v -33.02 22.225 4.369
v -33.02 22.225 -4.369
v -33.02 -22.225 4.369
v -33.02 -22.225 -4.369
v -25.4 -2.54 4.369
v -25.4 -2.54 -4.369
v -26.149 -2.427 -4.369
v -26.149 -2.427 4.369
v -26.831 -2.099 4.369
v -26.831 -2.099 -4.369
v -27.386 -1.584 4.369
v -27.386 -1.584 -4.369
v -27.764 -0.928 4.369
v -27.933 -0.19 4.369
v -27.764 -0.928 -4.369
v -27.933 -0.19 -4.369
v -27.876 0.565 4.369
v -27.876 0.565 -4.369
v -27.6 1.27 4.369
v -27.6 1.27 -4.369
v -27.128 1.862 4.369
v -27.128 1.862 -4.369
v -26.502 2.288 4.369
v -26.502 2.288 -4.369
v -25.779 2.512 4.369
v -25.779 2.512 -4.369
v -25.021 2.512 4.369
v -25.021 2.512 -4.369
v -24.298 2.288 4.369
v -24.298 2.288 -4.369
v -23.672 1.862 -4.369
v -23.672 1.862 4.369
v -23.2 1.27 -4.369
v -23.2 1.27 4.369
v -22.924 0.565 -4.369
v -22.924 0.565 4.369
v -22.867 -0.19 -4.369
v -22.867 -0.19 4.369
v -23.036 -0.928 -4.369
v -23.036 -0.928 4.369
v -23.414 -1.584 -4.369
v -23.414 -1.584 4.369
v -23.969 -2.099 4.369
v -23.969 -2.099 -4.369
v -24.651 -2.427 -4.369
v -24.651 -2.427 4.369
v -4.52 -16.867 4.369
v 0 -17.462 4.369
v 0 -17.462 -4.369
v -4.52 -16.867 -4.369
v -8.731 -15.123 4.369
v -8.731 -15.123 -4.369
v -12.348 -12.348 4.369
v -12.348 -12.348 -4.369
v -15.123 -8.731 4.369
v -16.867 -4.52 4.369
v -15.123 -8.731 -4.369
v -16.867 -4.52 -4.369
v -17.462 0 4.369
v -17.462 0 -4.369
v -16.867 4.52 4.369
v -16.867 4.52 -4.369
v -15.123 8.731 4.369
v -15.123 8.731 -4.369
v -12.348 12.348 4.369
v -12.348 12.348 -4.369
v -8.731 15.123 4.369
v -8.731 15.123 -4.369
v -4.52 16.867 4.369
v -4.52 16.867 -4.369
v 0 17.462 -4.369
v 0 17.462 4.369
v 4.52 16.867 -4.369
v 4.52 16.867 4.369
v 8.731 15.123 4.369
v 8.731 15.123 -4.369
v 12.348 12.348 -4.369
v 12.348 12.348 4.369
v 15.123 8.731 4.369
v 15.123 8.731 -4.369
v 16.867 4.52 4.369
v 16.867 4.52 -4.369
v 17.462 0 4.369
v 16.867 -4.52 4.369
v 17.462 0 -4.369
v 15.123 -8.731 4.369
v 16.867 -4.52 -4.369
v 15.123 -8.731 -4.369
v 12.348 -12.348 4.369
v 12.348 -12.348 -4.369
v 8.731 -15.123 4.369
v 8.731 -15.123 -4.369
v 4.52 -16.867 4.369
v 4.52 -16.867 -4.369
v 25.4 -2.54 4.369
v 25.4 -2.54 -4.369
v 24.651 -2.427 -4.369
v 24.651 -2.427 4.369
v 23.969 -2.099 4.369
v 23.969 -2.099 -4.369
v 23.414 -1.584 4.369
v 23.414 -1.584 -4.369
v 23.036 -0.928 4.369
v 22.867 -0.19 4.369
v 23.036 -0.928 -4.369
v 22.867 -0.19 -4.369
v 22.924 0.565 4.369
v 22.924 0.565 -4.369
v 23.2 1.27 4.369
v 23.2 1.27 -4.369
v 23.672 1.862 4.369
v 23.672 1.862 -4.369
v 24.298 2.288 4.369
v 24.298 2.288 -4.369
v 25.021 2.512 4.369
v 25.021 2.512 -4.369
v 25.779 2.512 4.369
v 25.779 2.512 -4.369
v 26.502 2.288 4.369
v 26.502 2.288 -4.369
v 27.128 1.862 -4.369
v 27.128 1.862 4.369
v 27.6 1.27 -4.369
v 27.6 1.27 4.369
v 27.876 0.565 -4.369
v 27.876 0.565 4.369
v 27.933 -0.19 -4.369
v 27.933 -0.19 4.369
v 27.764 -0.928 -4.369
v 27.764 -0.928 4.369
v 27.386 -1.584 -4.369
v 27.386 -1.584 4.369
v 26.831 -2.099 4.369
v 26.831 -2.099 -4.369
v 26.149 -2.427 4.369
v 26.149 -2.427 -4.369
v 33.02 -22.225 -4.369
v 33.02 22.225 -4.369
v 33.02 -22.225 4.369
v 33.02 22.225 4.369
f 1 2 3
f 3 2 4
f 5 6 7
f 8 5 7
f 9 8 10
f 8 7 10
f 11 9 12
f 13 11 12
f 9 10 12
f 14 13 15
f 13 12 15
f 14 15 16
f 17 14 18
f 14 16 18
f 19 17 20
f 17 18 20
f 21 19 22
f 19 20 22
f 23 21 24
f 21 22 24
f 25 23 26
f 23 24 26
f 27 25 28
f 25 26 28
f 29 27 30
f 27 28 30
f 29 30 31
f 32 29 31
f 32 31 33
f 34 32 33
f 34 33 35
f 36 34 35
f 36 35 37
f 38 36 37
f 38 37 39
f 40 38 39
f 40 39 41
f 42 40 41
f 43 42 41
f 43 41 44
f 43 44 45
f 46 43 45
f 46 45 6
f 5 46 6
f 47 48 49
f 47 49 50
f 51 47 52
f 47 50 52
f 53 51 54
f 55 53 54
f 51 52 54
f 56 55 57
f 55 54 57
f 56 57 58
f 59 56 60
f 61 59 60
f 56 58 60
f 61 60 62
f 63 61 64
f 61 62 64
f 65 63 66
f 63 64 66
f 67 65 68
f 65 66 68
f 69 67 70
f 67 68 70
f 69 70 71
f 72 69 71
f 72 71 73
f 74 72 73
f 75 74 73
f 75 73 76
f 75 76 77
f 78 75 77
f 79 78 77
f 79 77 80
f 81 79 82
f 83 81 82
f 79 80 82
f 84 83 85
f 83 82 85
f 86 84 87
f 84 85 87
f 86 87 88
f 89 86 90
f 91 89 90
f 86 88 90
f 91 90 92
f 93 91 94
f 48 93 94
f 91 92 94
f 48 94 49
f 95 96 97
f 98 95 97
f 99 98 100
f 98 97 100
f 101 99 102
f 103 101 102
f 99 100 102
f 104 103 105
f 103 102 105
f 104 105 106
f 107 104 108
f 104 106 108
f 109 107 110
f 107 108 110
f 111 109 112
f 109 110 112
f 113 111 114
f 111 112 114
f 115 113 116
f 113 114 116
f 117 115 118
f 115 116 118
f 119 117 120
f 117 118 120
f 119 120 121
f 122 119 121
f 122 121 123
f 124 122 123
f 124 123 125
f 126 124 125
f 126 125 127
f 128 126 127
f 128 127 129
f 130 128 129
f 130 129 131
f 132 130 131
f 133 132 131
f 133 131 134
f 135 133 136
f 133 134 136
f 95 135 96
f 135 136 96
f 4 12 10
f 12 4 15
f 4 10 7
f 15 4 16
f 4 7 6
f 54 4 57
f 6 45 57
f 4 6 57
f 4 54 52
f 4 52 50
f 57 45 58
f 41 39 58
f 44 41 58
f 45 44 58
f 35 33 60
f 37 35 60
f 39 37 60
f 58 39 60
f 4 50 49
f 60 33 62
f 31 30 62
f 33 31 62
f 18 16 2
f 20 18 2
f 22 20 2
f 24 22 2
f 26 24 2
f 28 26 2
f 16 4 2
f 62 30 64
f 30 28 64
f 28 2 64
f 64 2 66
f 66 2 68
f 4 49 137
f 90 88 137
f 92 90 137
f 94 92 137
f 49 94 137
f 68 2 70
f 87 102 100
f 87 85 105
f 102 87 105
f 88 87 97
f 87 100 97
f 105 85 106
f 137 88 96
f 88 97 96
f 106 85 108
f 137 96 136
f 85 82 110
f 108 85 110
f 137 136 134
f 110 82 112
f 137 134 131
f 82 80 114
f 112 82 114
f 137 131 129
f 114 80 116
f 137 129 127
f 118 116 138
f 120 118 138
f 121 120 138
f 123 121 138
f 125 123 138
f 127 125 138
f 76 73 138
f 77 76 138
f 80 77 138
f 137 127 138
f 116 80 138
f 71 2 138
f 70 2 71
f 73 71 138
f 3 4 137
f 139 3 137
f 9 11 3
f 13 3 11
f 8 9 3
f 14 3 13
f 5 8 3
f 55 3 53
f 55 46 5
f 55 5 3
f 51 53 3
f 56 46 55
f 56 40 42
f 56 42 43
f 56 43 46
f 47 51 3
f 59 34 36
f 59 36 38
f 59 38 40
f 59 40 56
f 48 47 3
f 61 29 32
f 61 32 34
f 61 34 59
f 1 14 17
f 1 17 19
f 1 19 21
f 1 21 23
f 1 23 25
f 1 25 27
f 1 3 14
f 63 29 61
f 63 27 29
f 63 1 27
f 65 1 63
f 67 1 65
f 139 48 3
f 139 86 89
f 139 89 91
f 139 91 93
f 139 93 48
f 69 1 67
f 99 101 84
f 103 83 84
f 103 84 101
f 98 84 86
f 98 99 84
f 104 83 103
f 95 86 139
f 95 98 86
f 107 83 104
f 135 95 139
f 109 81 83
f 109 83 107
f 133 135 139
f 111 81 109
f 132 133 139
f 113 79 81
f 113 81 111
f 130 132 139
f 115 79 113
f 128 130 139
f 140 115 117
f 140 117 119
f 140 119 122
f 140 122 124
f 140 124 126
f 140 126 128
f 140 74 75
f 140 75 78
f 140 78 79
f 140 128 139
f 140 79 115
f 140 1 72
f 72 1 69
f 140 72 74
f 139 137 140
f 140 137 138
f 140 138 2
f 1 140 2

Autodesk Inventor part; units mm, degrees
ref_plane "YZ Plane" through (0, 0, 0) normal (1, 0, 0) x (0, 1, 0)
ref_plane "XZ Plane" through (0, 0, 0) normal (0, 1, 0) x (-1, 0, 0)
ref_plane "XY Plane" through (0, 0, 0) normal (0, 0, 1) x (1, 0, 0)
sketch "Sketch1" plane through (0, 0, 0) normal (0, 0, 1) x (1, 0, 0)
  line L0 (-33.02, -22.225) -> (33.02, -22.225)
  line L1 (33.02, -22.225) -> (33.02, 22.225)
  line L2 (33.02, 22.225) -> (-33.02, 22.225)
  line L3 (-33.02, 22.225) -> (-33.02, -22.225)
  line L4 (-33.02, -22.225) -> (33.02, 22.225) construction
  line L5 (33.02, -22.225) -> (-33.02, 22.225) construction
  point P0 (0, 0)
  dimension "d0" = 66.04
  dimension "d1" = 44.45
extrude "Extrusion1" add sketch "Sketch1" along normal mid plane 8.7376
sketch "Sketch2" plane through (0, 0, 4.3688) normal (0, 0, 1) x (1, 0, 0)
  line L0 (-33.02, -22.225) -> (33.02, -22.225) projected
  line L1 (33.02, -22.225) -> (33.02, 22.225) projected
  line L2 (33.02, 22.225) -> (-33.02, 22.225) projected
  line L3 (-33.02, 22.225) -> (-33.02, -22.225) projected
  circle A0 centre (0, 0) radius 17.4625
  dimension "d4" = 34.925
hole "Hole1" at (0, 0, 4.3688) direction (0, 0, -1) diameter 34.925 end through all
sketch "Sketch3" plane through (0, 0, 4.3688) normal (0, 0, 1) x (1, 0, 0)
  circle A0 centre (0, 0) radius 17.4625 projected
  line L0 (-33.02, -22.225) -> (33.02, -22.225) projected
  line L1 (33.02, -22.225) -> (33.02, 22.225) projected
  line L2 (33.02, 22.225) -> (-33.02, 22.225) projected
  line L3 (-33.02, 22.225) -> (-33.02, -22.225) projected
  circle A1 centre (-25.4, 0) radius 2.54
  line L4 (0, 22.225) -> (0, -22.225) construction
  circle A2 centre (25.4, 0) radius 2.54
  dimension "d12" = 5.08
  dimension "d13" = 7.62
hole "Hole2" at (-25.4, 0, 4.3688) at (25.4, 0, 4.3688) direction (0, 0, -1) diameter 5.08 end through all
properties part number "Tapered Roller Bearing Housing" material "Aluminum 6061"
